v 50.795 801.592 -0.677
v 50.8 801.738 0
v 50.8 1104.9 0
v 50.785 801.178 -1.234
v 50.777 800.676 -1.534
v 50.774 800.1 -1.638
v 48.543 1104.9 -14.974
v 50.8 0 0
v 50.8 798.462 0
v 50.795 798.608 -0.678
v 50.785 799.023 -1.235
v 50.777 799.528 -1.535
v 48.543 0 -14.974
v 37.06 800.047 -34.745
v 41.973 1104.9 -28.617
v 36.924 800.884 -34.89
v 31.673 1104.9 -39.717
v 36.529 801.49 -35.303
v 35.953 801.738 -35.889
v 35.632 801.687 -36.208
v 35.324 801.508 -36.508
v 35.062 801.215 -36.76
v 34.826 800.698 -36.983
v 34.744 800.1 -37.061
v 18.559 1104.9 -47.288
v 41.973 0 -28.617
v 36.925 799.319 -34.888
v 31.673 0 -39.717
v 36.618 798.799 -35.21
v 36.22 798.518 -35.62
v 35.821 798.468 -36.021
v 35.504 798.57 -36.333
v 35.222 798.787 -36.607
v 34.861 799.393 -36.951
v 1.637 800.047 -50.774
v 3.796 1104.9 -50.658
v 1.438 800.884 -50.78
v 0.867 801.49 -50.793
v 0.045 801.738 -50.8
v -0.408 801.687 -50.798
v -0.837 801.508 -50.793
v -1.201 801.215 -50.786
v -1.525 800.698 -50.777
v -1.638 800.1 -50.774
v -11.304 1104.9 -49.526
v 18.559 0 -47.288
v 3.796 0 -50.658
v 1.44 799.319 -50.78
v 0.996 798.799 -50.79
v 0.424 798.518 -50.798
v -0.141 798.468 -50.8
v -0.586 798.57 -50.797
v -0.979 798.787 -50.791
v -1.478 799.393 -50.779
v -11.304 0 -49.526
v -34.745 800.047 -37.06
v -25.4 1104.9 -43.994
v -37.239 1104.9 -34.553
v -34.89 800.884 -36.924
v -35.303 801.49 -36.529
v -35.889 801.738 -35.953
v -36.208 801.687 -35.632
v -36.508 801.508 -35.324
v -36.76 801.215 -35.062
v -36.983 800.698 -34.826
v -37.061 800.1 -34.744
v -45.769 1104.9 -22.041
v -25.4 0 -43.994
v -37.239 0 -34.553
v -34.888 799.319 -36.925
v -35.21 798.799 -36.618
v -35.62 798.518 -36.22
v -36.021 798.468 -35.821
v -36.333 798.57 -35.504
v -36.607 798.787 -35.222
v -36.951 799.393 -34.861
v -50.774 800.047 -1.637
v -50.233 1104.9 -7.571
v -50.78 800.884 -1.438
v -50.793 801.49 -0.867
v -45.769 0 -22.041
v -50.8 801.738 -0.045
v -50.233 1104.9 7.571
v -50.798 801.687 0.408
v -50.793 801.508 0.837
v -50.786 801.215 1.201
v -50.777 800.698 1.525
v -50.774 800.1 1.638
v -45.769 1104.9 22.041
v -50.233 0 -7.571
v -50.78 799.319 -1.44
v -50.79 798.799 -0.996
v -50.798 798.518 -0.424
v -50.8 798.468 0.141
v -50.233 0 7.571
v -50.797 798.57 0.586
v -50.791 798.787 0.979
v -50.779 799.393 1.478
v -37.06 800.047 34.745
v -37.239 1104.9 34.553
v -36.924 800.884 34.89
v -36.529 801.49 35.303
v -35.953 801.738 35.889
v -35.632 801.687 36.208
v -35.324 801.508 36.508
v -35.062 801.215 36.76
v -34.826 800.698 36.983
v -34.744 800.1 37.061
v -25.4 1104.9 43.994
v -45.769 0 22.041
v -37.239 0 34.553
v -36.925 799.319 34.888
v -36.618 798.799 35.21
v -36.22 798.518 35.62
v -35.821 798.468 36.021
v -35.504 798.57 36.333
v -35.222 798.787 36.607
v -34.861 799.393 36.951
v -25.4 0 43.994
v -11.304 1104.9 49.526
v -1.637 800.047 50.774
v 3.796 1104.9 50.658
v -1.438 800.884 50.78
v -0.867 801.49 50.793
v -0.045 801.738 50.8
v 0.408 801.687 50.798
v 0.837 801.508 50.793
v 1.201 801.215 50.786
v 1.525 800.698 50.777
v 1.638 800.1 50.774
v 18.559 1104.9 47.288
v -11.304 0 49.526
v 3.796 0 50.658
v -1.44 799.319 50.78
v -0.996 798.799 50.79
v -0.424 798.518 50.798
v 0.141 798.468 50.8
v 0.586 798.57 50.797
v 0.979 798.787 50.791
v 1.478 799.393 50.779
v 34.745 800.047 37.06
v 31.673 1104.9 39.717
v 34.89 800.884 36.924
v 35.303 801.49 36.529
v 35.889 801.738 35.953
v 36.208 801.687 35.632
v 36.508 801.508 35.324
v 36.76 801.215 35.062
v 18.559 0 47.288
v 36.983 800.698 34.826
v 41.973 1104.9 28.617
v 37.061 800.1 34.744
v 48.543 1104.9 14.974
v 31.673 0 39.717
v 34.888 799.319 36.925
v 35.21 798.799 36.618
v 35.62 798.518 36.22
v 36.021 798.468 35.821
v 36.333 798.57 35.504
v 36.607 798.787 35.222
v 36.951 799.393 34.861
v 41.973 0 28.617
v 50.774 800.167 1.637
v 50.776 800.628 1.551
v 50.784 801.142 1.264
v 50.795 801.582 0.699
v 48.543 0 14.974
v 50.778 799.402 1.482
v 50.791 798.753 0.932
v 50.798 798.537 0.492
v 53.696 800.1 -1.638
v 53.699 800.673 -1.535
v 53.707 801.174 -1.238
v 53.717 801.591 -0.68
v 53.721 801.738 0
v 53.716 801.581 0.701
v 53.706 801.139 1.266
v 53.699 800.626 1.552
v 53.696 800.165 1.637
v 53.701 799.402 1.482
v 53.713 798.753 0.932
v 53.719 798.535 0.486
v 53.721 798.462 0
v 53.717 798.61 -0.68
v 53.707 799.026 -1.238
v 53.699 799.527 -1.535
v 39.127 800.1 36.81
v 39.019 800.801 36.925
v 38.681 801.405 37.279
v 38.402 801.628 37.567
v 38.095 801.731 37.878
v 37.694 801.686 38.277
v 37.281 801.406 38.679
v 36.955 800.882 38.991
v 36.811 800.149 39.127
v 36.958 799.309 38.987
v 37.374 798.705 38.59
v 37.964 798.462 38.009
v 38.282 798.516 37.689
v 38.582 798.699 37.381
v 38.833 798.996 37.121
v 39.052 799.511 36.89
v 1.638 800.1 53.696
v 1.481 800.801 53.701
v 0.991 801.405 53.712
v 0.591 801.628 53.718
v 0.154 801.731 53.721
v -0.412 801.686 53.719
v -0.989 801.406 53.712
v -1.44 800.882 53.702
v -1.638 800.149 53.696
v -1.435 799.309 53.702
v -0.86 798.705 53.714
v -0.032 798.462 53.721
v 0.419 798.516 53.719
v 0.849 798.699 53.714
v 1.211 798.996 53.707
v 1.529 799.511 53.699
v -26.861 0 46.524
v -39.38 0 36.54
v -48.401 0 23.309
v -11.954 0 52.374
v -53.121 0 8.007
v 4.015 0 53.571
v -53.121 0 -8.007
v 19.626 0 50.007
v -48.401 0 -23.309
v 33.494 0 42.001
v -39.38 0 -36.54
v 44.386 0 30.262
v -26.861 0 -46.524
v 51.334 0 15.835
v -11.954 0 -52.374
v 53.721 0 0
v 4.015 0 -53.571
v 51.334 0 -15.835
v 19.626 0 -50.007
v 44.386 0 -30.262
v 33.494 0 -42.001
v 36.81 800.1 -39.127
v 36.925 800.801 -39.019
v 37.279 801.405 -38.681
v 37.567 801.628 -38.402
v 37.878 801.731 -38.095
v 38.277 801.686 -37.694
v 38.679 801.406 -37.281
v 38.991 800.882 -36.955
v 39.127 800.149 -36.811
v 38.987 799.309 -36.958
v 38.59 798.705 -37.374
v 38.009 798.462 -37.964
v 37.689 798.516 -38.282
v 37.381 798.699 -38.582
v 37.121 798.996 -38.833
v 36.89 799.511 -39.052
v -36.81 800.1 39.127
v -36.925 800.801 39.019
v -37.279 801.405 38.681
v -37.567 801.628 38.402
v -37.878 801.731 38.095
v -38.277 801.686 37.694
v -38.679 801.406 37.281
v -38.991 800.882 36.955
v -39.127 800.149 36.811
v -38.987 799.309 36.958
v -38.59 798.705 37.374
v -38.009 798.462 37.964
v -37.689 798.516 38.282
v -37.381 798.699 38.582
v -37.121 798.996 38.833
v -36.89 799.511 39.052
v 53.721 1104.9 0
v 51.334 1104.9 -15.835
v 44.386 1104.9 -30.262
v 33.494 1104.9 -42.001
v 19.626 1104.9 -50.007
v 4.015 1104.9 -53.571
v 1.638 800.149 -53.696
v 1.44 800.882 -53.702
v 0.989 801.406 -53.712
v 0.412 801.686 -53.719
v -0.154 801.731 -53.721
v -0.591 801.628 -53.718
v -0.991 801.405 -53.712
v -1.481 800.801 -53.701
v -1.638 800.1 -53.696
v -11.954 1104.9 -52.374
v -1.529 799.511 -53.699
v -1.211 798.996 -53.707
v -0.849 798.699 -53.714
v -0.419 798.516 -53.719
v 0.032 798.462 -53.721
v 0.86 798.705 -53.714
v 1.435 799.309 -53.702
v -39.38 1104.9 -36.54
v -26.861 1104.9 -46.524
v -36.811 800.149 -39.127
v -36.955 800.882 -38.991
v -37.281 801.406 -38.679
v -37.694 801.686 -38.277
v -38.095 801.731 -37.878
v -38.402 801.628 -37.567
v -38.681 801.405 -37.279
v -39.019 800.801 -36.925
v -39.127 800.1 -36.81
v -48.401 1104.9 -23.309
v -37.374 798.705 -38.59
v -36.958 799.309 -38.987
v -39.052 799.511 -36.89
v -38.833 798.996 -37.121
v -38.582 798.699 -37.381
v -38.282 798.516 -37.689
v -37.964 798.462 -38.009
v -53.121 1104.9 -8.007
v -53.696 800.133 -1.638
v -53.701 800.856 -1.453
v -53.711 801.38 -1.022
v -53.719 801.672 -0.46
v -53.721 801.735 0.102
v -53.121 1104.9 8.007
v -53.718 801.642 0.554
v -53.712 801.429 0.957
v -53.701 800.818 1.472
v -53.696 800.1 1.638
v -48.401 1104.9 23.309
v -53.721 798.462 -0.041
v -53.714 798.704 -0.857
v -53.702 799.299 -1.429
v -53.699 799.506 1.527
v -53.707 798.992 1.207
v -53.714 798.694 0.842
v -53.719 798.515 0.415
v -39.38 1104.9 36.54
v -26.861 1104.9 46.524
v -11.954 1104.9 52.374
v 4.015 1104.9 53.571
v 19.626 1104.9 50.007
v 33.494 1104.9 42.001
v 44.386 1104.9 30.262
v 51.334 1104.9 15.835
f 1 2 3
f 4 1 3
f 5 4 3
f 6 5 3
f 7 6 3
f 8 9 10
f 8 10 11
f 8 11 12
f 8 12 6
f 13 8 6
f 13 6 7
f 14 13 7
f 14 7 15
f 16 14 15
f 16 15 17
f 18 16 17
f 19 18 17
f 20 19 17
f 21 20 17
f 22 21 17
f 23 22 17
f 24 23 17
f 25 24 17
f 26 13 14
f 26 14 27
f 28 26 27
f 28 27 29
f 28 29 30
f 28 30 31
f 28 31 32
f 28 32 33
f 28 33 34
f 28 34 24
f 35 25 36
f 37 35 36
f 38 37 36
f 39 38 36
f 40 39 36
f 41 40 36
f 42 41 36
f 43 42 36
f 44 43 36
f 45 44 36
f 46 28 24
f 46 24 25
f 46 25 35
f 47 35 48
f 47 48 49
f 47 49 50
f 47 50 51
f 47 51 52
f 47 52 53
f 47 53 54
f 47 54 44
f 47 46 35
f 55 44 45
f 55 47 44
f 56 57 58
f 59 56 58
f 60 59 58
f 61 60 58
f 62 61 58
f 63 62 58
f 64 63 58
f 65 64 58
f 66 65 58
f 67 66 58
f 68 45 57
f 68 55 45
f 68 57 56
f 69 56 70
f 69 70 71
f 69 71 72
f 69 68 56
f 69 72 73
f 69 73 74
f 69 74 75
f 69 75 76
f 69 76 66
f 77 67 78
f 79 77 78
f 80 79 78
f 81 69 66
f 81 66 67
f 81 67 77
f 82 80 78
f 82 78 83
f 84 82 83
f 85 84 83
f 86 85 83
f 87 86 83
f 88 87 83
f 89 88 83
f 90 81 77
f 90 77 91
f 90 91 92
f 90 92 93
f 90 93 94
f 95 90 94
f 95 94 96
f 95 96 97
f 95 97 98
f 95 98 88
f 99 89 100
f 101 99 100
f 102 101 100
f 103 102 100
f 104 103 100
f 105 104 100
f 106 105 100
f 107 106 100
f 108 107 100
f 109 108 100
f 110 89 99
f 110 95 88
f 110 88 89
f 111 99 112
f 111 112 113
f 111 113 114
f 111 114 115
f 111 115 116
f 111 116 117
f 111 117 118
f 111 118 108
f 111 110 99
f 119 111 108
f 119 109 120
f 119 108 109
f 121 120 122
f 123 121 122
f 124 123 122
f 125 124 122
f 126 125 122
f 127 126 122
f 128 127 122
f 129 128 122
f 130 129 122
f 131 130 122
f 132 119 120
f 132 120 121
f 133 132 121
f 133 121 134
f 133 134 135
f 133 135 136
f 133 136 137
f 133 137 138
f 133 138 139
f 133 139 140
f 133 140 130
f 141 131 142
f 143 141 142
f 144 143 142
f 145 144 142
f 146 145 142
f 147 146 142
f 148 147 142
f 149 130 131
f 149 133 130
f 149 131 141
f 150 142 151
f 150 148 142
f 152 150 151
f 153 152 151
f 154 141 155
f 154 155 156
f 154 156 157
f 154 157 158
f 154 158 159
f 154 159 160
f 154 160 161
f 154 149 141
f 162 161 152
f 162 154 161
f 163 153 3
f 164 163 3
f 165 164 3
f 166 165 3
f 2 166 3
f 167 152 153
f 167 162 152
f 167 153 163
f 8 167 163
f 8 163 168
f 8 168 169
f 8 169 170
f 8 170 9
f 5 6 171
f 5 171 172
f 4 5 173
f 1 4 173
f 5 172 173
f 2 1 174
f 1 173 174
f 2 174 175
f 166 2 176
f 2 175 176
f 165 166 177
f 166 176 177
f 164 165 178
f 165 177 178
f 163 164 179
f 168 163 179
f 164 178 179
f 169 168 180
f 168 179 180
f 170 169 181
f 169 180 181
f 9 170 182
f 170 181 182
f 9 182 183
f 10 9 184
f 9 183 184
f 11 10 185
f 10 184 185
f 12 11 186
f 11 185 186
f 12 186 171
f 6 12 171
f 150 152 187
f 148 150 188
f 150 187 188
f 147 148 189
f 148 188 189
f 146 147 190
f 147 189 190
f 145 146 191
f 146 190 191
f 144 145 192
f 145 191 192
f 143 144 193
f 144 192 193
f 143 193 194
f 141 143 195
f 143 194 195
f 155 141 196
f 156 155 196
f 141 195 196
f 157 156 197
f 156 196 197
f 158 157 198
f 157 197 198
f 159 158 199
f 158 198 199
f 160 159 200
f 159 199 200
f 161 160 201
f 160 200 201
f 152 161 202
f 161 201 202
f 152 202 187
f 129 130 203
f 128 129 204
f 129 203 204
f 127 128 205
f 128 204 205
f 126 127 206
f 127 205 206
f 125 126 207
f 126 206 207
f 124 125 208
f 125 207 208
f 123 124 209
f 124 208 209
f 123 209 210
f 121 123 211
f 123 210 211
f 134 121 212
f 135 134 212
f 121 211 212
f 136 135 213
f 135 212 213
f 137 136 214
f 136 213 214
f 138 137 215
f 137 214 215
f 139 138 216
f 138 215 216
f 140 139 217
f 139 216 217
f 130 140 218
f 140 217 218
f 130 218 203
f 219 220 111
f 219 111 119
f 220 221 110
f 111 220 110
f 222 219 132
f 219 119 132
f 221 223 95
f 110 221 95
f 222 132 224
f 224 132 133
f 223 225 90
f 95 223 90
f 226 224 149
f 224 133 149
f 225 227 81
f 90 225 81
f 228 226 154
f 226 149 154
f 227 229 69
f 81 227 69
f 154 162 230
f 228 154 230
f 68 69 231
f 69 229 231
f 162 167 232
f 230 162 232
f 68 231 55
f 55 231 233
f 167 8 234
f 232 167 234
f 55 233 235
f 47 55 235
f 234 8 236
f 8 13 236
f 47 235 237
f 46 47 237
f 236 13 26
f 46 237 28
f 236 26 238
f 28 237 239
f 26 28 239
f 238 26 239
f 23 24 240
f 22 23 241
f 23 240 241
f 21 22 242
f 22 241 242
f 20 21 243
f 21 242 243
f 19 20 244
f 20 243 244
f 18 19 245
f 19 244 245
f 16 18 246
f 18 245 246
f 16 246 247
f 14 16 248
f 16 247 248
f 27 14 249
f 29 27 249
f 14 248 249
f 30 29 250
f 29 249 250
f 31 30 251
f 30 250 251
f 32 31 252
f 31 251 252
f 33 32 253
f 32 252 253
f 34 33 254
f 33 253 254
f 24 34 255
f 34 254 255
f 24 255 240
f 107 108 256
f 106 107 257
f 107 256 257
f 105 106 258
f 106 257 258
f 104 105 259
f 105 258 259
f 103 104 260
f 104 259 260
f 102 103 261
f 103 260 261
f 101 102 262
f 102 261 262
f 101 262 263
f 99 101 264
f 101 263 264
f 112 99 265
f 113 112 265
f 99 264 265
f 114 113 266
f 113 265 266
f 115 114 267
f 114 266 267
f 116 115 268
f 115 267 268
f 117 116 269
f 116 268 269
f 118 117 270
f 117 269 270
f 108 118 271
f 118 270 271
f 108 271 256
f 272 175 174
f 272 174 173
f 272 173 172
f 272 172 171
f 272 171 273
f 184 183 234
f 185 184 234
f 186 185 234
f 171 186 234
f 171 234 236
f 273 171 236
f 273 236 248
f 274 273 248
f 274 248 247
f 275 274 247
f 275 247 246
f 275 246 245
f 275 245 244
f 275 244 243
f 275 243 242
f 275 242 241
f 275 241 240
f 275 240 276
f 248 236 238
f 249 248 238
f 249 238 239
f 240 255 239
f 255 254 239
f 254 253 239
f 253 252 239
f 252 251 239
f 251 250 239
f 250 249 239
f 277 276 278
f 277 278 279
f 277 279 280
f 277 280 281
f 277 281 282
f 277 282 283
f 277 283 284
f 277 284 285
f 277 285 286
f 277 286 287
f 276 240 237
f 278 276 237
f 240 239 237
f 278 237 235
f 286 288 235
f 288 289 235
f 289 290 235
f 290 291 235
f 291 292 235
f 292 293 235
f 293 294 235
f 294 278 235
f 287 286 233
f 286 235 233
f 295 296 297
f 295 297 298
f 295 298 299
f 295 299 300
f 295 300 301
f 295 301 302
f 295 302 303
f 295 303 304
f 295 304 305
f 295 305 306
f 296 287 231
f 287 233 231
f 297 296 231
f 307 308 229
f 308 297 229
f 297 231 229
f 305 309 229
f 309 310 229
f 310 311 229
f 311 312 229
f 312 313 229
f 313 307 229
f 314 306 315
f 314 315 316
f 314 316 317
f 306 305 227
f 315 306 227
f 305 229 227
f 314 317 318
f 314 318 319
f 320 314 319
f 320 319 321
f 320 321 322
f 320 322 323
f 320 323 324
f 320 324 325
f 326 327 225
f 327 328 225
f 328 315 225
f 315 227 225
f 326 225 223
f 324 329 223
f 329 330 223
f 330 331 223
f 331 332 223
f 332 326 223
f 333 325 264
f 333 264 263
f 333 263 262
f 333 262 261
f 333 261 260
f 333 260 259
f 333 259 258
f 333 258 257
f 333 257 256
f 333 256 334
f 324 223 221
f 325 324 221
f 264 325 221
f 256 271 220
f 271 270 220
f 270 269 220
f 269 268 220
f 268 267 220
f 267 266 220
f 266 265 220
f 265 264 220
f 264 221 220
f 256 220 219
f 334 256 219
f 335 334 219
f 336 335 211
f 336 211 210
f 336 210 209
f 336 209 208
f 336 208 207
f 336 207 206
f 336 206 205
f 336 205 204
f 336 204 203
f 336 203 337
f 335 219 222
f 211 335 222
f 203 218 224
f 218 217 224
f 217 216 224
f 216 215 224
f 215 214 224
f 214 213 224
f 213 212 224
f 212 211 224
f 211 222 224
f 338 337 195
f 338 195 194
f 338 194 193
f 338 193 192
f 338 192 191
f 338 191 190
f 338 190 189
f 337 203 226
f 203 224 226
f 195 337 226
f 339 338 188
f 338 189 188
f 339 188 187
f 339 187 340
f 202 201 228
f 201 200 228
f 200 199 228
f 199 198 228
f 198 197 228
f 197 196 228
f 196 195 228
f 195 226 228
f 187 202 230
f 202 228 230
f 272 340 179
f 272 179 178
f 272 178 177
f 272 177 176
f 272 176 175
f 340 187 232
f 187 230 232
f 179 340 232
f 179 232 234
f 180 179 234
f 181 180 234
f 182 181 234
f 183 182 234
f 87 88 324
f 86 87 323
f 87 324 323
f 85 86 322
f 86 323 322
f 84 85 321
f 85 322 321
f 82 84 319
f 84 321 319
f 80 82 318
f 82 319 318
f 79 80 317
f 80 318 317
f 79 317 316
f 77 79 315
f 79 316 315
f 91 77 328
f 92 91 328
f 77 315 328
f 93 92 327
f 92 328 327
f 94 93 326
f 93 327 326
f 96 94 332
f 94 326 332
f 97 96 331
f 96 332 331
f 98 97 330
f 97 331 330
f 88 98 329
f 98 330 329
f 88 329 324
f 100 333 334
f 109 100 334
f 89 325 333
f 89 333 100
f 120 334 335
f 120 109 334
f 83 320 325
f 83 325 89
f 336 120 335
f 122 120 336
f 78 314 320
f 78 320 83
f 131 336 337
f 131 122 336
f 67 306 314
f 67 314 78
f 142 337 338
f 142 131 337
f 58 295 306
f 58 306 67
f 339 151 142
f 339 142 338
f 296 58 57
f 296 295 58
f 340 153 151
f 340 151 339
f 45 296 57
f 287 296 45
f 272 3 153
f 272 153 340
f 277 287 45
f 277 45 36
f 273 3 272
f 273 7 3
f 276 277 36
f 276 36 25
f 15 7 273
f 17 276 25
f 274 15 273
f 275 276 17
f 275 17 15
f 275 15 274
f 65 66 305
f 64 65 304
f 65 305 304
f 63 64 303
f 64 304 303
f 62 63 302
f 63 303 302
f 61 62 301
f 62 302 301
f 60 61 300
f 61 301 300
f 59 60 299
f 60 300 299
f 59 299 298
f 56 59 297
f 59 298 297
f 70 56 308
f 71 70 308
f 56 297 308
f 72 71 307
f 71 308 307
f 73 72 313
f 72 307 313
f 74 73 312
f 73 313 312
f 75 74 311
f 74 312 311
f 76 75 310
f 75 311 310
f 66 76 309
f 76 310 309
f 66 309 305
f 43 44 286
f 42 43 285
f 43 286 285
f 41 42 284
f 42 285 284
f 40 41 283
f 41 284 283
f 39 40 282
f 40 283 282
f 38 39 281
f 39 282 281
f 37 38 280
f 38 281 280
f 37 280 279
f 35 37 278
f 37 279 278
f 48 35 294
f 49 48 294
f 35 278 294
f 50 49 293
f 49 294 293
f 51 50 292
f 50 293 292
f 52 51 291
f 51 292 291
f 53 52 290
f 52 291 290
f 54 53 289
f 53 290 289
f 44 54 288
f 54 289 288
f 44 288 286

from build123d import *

# Parameters (mm, degrees)
SKETCH1_R                 = 53.721
SKETCH1_R_2               = 50.8
BODY_TUBE_EXTRUSION_DEPTH = 1104.9
BULKHEAD_HOLE_REACH       = 1113.411
BULKHEAD_HOLE_END_RADIUS  = 50.8
SKETCH2_R                 = 1.6383
CIRPATTERN1_COUNT         = 8


with BuildPart() as part:
    # Sketch1 → Body Tube Extrusion (new body)
    with BuildSketch(Plane(origin=(0, 0, 0), x_dir=(1, 0, 0), z_dir=(0, 1, 0))):
        Circle(SKETCH1_R)
        Circle(SKETCH1_R_2, mode=Mode.SUBTRACT)
    extrude(amount=BODY_TUBE_EXTRUSION_DEPTH)

    # Bulkhead Hole: up to this cylinder (the profile starts outside it)
    bulkhead_hole_end = Plane(origin=(0, 800.1, 0), z_dir=(0, -1, 0)) * Cylinder(BULKHEAD_HOLE_END_RADIUS, 2329.422, mode=Mode.PRIVATE)
    # Sketch2 → Bulkhead Hole (cut, up to the surface)
    with BuildSketch(Plane.XY.offset(53.721), mode=Mode.PRIVATE) as bulkhead_hole_sk1:
        with Locations((0, 800.1)):
            Circle(SKETCH2_R)
    bulkhead_hole_tool1 = extrude(bulkhead_hole_sk1.sketch, amount=-BULKHEAD_HOLE_REACH, mode=Mode.PRIVATE) - bulkhead_hole_end
    bulkhead_hole = bulkhead_hole_tool1.solids().sort_by_distance((0, 800.1, 53.721))[0]
    add(bulkhead_hole, mode=Mode.SUBTRACT)

    # CirPattern1: Bulkhead Hole ×8 about axis
    cirpattern1_axis = Axis((0, 1104.9, 0), (0, -1, 0))
    for i in range(1, CIRPATTERN1_COUNT):
        add(bulkhead_hole.rotate(cirpattern1_axis, i * 360 / CIRPATTERN1_COUNT), mode=Mode.SUBTRACT)


solid = part.part
